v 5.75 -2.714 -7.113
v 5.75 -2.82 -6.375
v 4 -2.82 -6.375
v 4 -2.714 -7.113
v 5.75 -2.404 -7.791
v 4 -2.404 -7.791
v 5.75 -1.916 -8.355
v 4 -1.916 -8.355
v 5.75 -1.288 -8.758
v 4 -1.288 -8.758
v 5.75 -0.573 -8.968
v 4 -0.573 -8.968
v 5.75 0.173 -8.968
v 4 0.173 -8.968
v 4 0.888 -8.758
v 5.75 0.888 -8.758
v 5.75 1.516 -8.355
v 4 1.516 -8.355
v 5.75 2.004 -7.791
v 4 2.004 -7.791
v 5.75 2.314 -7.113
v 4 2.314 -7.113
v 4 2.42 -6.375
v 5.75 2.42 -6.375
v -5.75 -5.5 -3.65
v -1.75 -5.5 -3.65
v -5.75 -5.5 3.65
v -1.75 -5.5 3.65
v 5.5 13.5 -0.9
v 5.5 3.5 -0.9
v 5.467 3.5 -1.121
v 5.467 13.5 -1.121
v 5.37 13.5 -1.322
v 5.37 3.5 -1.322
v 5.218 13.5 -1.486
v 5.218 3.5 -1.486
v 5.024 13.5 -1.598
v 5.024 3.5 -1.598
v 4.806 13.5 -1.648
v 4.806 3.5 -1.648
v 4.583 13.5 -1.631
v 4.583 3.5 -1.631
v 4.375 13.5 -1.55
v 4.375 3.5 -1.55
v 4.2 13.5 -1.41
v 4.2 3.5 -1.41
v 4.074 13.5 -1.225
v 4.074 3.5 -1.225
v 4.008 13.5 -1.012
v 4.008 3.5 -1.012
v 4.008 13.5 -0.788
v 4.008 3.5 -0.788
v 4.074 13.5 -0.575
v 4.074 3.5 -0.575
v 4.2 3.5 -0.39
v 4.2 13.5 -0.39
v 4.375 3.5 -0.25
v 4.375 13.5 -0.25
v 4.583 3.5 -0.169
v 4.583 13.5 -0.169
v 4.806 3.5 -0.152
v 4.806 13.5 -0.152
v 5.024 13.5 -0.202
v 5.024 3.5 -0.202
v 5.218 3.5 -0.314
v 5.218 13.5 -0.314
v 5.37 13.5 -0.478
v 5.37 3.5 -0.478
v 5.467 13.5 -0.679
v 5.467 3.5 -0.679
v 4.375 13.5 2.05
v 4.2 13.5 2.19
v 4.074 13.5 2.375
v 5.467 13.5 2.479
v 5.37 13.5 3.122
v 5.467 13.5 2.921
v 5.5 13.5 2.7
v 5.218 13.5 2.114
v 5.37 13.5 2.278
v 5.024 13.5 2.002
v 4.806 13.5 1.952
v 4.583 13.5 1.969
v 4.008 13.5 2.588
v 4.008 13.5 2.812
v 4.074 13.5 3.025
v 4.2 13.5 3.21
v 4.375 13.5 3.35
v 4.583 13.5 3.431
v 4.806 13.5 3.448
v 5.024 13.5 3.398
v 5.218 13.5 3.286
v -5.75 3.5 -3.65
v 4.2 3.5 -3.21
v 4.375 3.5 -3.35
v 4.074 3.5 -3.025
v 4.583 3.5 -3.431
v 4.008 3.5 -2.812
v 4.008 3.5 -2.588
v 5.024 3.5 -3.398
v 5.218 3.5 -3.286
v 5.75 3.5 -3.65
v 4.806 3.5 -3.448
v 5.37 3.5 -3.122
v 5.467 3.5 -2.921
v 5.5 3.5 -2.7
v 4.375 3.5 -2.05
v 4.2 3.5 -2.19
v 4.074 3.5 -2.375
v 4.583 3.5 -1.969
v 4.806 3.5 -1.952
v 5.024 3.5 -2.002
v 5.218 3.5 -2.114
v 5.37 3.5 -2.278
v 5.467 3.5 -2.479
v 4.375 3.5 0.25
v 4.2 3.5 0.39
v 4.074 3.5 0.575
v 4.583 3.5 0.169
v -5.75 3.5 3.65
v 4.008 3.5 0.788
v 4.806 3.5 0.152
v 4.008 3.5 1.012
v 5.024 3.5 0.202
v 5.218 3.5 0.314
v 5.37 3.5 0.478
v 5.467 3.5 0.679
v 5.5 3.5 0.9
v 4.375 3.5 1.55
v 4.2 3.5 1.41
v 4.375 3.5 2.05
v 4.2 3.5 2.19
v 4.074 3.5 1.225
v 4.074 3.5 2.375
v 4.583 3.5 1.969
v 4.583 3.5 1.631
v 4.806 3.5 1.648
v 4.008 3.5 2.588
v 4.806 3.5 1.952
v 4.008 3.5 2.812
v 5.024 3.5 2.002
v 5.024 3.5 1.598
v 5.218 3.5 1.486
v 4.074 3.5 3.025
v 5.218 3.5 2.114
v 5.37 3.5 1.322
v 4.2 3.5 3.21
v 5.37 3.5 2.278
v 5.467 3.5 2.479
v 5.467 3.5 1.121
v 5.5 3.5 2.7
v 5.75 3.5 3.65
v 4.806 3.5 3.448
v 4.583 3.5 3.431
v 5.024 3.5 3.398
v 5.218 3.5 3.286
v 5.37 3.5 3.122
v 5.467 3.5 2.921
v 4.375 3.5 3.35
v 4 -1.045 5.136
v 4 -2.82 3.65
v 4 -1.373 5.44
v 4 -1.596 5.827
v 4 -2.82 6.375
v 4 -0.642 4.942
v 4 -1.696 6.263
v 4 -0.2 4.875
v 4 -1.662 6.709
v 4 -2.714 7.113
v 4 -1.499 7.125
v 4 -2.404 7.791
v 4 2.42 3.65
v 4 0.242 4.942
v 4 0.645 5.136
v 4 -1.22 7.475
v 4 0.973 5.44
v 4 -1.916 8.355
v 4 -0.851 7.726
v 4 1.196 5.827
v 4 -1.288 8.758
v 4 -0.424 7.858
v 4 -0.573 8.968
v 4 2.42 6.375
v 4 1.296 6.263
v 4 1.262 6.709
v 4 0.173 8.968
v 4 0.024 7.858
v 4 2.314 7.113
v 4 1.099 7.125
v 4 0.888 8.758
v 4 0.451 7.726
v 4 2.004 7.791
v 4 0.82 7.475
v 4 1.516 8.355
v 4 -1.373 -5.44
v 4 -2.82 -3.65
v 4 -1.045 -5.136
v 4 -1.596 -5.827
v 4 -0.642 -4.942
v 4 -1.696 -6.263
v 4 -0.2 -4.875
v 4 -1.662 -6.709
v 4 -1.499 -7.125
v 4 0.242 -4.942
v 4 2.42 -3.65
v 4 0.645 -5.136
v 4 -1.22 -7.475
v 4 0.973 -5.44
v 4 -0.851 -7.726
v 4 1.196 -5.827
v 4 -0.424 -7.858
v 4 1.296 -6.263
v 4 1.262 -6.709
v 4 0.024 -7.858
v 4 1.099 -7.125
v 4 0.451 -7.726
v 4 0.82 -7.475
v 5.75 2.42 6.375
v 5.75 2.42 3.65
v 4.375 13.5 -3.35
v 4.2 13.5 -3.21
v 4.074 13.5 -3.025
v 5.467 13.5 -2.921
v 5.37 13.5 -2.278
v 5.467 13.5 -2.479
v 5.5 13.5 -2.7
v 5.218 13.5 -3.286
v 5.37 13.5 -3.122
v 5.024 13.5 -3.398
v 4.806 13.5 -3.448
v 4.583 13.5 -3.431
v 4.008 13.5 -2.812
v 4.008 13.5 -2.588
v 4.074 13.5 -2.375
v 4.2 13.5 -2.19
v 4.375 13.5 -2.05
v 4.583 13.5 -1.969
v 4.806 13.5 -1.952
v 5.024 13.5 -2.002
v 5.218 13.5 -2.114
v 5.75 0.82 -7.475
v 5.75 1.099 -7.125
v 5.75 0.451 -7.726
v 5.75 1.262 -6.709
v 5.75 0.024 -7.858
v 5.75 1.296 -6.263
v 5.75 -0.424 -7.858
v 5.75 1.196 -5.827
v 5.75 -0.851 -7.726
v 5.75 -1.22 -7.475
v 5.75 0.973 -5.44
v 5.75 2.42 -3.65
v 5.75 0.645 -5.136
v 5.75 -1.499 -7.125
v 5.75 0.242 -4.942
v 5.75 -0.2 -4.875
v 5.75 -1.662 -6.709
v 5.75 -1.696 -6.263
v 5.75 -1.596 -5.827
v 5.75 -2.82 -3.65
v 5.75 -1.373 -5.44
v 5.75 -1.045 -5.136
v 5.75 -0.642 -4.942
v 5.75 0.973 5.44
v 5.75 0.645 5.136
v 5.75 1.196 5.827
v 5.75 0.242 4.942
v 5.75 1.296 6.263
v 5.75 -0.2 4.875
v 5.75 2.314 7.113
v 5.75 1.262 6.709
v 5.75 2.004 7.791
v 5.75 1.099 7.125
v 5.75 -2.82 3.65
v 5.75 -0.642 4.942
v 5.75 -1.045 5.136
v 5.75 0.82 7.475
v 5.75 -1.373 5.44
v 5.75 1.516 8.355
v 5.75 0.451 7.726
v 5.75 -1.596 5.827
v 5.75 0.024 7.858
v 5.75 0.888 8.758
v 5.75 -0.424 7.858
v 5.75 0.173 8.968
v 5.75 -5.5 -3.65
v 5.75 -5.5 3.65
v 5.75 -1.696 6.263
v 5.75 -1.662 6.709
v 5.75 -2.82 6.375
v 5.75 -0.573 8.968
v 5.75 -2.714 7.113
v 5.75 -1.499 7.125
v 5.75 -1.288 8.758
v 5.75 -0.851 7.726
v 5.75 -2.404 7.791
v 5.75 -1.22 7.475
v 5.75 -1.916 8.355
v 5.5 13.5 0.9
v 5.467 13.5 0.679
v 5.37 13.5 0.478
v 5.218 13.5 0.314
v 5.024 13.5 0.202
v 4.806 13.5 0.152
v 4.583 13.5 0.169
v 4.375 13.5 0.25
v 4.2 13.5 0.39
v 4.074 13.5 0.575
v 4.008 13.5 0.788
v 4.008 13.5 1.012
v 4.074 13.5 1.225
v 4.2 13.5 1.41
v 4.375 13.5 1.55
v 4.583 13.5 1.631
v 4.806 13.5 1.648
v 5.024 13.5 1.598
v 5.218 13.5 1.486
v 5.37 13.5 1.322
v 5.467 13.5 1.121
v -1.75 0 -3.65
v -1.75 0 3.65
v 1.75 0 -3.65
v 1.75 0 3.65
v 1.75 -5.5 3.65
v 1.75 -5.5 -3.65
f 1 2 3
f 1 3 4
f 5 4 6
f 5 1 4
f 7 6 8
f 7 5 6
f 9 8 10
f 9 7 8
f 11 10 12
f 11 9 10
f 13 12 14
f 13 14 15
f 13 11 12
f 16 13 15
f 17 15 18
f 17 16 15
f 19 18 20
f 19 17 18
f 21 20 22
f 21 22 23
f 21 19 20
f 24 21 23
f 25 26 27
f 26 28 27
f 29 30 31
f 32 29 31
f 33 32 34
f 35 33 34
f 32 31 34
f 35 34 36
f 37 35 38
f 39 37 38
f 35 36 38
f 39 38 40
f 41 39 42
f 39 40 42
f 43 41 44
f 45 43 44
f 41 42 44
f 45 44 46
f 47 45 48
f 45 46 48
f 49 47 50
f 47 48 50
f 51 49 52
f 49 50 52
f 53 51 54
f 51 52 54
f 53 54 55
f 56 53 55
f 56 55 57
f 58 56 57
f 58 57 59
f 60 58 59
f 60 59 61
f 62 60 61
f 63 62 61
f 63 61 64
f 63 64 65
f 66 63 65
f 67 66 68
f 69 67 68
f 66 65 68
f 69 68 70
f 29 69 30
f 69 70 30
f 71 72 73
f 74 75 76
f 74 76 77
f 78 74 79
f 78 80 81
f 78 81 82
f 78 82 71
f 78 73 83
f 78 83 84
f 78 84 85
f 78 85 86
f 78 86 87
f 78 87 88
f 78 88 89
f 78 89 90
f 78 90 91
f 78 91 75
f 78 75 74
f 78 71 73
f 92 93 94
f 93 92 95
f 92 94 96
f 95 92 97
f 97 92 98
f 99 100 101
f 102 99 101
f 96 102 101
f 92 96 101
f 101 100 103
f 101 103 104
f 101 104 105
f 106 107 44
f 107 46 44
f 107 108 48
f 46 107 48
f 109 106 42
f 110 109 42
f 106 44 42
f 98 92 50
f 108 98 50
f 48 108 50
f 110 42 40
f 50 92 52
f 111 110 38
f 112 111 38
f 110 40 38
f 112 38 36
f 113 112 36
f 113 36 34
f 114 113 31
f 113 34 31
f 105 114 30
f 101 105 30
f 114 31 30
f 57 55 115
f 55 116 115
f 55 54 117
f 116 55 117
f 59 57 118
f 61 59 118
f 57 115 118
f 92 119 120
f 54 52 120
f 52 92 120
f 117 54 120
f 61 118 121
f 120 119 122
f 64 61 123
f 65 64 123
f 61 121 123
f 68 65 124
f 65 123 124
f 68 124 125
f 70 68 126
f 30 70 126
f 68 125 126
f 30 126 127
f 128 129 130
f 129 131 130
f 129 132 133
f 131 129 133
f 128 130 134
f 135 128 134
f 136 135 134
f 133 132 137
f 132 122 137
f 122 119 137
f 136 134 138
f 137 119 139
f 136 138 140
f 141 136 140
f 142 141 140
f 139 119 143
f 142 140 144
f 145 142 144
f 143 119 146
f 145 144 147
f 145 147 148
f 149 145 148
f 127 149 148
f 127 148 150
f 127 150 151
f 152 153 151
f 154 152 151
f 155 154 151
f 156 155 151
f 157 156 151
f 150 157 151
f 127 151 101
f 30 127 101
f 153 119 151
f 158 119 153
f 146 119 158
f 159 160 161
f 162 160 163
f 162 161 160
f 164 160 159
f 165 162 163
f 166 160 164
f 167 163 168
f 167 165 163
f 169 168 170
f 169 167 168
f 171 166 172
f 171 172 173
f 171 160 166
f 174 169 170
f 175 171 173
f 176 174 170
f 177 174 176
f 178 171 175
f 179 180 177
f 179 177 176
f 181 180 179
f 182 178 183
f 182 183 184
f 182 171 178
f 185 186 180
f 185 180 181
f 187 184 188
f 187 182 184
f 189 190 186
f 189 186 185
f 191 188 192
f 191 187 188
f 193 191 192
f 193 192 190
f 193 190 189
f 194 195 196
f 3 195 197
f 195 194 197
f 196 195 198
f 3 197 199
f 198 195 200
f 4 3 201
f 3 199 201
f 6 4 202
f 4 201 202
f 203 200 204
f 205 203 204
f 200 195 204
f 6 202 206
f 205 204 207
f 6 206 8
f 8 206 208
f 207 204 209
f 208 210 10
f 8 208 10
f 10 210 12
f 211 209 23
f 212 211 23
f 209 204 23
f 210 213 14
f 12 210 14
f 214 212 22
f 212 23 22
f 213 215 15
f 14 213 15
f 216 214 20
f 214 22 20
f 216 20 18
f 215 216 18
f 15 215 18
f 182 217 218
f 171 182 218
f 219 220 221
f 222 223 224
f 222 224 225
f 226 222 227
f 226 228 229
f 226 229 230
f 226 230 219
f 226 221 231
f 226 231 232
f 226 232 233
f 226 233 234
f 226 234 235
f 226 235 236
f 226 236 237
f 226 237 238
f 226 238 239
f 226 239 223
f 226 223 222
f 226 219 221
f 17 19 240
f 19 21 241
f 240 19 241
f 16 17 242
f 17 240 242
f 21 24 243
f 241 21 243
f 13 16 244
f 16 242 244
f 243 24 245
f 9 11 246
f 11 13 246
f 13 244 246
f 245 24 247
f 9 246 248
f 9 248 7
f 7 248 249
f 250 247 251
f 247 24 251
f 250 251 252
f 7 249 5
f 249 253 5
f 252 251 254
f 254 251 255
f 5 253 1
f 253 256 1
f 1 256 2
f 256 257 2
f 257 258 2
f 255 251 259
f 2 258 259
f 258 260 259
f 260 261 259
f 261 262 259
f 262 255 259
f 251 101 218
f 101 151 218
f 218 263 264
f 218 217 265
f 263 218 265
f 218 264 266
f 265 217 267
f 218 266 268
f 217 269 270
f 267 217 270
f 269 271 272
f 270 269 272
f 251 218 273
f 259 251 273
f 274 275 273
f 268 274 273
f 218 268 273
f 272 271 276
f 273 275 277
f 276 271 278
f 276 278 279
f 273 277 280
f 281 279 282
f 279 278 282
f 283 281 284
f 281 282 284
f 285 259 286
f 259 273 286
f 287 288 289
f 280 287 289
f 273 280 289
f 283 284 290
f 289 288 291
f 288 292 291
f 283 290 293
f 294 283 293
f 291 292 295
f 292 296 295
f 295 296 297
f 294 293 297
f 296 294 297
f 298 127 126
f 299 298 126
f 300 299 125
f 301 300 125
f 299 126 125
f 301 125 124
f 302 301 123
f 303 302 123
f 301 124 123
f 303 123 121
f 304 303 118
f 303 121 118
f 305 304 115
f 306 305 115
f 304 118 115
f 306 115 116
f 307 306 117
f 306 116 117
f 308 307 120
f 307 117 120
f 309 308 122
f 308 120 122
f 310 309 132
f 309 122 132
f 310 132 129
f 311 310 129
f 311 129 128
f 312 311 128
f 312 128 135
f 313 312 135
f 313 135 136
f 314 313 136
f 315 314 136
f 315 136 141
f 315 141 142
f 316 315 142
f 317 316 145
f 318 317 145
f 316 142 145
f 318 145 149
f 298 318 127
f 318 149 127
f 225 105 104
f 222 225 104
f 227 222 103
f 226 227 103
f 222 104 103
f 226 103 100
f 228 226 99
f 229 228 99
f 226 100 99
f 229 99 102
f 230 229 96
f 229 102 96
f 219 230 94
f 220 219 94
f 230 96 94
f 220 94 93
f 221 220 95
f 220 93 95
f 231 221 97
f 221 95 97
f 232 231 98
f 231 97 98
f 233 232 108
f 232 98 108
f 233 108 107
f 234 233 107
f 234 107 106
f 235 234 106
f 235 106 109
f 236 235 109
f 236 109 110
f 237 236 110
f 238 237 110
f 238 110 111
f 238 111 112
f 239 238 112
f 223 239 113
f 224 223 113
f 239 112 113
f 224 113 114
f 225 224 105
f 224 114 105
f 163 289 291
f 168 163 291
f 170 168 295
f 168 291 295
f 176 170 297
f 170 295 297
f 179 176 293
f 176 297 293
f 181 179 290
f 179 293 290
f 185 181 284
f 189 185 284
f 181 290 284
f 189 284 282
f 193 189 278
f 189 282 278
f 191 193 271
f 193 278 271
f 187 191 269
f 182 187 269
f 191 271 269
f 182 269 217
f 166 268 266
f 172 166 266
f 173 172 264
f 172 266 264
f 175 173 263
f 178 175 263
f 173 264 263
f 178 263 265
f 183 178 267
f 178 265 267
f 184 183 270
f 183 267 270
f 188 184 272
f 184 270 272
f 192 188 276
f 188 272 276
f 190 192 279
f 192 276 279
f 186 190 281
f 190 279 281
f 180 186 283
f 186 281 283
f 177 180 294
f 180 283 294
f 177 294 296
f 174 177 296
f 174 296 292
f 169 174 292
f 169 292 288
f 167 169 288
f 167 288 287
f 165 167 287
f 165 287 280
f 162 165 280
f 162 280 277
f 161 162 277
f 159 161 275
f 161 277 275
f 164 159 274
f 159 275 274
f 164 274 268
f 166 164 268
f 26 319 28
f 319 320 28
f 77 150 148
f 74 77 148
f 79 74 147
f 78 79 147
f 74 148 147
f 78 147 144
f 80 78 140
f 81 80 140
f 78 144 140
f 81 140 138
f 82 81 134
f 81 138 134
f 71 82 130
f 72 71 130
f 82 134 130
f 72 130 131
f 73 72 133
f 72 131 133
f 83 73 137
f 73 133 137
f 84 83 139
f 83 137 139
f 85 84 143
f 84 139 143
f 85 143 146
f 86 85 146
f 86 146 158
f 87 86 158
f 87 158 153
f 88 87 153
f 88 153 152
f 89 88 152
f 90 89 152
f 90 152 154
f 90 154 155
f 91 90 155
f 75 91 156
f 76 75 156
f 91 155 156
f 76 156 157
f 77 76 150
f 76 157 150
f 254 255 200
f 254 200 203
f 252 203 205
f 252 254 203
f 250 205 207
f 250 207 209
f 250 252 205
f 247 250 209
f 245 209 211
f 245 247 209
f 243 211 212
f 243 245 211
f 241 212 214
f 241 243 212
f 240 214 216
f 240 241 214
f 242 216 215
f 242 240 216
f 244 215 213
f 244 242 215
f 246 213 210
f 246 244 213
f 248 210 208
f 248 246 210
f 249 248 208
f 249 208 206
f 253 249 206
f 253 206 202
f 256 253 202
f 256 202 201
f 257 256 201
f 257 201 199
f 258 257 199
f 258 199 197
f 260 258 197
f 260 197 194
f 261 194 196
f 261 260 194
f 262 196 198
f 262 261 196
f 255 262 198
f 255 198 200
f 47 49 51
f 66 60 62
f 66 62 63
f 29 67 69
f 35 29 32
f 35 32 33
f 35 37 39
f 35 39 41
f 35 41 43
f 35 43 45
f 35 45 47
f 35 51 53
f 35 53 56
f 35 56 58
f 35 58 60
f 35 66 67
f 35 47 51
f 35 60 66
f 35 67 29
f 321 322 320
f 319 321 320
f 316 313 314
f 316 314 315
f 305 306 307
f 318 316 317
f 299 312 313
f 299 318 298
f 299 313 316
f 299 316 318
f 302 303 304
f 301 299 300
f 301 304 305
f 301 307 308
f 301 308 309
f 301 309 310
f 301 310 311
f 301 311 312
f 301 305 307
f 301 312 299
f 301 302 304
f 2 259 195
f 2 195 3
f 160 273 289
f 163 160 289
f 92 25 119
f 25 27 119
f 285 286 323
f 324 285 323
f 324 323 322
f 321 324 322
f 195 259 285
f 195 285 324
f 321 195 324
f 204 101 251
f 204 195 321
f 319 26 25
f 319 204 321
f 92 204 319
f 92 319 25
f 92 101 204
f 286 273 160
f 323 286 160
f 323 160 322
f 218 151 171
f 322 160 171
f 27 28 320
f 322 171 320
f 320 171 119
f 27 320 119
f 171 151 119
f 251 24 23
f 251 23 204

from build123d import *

# Parameters (mm, degrees)
BOSS_EXTRU_1_DEPTH = 3.65
ESQUISSE2_R        = 1.5
BOSS_EXTRU_2_DEPTH = 1.75
ESQUISSE3_R        = 0.75
BOSS_EXTRU_3_DEPTH = 10


with BuildPart() as part:
    # Esquisse1 → Boss.-Extru.1 (new, symmetric)
    with BuildSketch(Plane.XY):
        Polygon((1.75, 0), (-1.75, 0), (-1.75, -5.5), (-5.75, -5.5), (-5.75, 3.5), (5.75, 3.5), (5.75, -5.5), (1.75, -5.5), align=None)
    extrude(amount=BOSS_EXTRU_1_DEPTH, both=True)

    # Esquisse2 → Boss.-Extru.2 (add)
    with BuildSketch(Plane(origin=(5.75, 0, 0), x_dir=(0, 0, -1), z_dir=(1, 0, 0))):
        with BuildLine():
            Line((-6.375, 2.42), (-3.65, 2.42))
            Line((-3.65, 2.42), (-3.65, -2.82))
            Line((-3.65, -2.82), (-6.375, -2.82))
            ThreePointArc((-6.375, -2.82), (-8.995, -0.2), (-6.375, 2.42))
        make_face()
        with Locations((-6.375, -0.2)):
            Circle(ESQUISSE2_R, mode=Mode.SUBTRACT)
    boss_extru_2 = extrude(amount=-BOSS_EXTRU_2_DEPTH)

    # Symétrie1: Boss.-Extru.2 across plane
    add(boss_extru_2.mirror(Plane.XY))

    # Esquisse3 → Boss.-Extru.3 (add)
    with BuildSketch(Plane(origin=(0, 3.5, 0), x_dir=(1, 0, 0), z_dir=(0, 1, 0))):
        with Locations((4.75, 2.7)):
            Circle(ESQUISSE3_R)
        with Locations((4.75, 0.9)):
            Circle(ESQUISSE3_R)
        with Locations((4.75, -0.9)):
            Circle(ESQUISSE3_R)
        with Locations((4.75, -2.7)):
            Circle(ESQUISSE3_R)
    extrude(amount=BOSS_EXTRU_3_DEPTH)


solid = part.part
